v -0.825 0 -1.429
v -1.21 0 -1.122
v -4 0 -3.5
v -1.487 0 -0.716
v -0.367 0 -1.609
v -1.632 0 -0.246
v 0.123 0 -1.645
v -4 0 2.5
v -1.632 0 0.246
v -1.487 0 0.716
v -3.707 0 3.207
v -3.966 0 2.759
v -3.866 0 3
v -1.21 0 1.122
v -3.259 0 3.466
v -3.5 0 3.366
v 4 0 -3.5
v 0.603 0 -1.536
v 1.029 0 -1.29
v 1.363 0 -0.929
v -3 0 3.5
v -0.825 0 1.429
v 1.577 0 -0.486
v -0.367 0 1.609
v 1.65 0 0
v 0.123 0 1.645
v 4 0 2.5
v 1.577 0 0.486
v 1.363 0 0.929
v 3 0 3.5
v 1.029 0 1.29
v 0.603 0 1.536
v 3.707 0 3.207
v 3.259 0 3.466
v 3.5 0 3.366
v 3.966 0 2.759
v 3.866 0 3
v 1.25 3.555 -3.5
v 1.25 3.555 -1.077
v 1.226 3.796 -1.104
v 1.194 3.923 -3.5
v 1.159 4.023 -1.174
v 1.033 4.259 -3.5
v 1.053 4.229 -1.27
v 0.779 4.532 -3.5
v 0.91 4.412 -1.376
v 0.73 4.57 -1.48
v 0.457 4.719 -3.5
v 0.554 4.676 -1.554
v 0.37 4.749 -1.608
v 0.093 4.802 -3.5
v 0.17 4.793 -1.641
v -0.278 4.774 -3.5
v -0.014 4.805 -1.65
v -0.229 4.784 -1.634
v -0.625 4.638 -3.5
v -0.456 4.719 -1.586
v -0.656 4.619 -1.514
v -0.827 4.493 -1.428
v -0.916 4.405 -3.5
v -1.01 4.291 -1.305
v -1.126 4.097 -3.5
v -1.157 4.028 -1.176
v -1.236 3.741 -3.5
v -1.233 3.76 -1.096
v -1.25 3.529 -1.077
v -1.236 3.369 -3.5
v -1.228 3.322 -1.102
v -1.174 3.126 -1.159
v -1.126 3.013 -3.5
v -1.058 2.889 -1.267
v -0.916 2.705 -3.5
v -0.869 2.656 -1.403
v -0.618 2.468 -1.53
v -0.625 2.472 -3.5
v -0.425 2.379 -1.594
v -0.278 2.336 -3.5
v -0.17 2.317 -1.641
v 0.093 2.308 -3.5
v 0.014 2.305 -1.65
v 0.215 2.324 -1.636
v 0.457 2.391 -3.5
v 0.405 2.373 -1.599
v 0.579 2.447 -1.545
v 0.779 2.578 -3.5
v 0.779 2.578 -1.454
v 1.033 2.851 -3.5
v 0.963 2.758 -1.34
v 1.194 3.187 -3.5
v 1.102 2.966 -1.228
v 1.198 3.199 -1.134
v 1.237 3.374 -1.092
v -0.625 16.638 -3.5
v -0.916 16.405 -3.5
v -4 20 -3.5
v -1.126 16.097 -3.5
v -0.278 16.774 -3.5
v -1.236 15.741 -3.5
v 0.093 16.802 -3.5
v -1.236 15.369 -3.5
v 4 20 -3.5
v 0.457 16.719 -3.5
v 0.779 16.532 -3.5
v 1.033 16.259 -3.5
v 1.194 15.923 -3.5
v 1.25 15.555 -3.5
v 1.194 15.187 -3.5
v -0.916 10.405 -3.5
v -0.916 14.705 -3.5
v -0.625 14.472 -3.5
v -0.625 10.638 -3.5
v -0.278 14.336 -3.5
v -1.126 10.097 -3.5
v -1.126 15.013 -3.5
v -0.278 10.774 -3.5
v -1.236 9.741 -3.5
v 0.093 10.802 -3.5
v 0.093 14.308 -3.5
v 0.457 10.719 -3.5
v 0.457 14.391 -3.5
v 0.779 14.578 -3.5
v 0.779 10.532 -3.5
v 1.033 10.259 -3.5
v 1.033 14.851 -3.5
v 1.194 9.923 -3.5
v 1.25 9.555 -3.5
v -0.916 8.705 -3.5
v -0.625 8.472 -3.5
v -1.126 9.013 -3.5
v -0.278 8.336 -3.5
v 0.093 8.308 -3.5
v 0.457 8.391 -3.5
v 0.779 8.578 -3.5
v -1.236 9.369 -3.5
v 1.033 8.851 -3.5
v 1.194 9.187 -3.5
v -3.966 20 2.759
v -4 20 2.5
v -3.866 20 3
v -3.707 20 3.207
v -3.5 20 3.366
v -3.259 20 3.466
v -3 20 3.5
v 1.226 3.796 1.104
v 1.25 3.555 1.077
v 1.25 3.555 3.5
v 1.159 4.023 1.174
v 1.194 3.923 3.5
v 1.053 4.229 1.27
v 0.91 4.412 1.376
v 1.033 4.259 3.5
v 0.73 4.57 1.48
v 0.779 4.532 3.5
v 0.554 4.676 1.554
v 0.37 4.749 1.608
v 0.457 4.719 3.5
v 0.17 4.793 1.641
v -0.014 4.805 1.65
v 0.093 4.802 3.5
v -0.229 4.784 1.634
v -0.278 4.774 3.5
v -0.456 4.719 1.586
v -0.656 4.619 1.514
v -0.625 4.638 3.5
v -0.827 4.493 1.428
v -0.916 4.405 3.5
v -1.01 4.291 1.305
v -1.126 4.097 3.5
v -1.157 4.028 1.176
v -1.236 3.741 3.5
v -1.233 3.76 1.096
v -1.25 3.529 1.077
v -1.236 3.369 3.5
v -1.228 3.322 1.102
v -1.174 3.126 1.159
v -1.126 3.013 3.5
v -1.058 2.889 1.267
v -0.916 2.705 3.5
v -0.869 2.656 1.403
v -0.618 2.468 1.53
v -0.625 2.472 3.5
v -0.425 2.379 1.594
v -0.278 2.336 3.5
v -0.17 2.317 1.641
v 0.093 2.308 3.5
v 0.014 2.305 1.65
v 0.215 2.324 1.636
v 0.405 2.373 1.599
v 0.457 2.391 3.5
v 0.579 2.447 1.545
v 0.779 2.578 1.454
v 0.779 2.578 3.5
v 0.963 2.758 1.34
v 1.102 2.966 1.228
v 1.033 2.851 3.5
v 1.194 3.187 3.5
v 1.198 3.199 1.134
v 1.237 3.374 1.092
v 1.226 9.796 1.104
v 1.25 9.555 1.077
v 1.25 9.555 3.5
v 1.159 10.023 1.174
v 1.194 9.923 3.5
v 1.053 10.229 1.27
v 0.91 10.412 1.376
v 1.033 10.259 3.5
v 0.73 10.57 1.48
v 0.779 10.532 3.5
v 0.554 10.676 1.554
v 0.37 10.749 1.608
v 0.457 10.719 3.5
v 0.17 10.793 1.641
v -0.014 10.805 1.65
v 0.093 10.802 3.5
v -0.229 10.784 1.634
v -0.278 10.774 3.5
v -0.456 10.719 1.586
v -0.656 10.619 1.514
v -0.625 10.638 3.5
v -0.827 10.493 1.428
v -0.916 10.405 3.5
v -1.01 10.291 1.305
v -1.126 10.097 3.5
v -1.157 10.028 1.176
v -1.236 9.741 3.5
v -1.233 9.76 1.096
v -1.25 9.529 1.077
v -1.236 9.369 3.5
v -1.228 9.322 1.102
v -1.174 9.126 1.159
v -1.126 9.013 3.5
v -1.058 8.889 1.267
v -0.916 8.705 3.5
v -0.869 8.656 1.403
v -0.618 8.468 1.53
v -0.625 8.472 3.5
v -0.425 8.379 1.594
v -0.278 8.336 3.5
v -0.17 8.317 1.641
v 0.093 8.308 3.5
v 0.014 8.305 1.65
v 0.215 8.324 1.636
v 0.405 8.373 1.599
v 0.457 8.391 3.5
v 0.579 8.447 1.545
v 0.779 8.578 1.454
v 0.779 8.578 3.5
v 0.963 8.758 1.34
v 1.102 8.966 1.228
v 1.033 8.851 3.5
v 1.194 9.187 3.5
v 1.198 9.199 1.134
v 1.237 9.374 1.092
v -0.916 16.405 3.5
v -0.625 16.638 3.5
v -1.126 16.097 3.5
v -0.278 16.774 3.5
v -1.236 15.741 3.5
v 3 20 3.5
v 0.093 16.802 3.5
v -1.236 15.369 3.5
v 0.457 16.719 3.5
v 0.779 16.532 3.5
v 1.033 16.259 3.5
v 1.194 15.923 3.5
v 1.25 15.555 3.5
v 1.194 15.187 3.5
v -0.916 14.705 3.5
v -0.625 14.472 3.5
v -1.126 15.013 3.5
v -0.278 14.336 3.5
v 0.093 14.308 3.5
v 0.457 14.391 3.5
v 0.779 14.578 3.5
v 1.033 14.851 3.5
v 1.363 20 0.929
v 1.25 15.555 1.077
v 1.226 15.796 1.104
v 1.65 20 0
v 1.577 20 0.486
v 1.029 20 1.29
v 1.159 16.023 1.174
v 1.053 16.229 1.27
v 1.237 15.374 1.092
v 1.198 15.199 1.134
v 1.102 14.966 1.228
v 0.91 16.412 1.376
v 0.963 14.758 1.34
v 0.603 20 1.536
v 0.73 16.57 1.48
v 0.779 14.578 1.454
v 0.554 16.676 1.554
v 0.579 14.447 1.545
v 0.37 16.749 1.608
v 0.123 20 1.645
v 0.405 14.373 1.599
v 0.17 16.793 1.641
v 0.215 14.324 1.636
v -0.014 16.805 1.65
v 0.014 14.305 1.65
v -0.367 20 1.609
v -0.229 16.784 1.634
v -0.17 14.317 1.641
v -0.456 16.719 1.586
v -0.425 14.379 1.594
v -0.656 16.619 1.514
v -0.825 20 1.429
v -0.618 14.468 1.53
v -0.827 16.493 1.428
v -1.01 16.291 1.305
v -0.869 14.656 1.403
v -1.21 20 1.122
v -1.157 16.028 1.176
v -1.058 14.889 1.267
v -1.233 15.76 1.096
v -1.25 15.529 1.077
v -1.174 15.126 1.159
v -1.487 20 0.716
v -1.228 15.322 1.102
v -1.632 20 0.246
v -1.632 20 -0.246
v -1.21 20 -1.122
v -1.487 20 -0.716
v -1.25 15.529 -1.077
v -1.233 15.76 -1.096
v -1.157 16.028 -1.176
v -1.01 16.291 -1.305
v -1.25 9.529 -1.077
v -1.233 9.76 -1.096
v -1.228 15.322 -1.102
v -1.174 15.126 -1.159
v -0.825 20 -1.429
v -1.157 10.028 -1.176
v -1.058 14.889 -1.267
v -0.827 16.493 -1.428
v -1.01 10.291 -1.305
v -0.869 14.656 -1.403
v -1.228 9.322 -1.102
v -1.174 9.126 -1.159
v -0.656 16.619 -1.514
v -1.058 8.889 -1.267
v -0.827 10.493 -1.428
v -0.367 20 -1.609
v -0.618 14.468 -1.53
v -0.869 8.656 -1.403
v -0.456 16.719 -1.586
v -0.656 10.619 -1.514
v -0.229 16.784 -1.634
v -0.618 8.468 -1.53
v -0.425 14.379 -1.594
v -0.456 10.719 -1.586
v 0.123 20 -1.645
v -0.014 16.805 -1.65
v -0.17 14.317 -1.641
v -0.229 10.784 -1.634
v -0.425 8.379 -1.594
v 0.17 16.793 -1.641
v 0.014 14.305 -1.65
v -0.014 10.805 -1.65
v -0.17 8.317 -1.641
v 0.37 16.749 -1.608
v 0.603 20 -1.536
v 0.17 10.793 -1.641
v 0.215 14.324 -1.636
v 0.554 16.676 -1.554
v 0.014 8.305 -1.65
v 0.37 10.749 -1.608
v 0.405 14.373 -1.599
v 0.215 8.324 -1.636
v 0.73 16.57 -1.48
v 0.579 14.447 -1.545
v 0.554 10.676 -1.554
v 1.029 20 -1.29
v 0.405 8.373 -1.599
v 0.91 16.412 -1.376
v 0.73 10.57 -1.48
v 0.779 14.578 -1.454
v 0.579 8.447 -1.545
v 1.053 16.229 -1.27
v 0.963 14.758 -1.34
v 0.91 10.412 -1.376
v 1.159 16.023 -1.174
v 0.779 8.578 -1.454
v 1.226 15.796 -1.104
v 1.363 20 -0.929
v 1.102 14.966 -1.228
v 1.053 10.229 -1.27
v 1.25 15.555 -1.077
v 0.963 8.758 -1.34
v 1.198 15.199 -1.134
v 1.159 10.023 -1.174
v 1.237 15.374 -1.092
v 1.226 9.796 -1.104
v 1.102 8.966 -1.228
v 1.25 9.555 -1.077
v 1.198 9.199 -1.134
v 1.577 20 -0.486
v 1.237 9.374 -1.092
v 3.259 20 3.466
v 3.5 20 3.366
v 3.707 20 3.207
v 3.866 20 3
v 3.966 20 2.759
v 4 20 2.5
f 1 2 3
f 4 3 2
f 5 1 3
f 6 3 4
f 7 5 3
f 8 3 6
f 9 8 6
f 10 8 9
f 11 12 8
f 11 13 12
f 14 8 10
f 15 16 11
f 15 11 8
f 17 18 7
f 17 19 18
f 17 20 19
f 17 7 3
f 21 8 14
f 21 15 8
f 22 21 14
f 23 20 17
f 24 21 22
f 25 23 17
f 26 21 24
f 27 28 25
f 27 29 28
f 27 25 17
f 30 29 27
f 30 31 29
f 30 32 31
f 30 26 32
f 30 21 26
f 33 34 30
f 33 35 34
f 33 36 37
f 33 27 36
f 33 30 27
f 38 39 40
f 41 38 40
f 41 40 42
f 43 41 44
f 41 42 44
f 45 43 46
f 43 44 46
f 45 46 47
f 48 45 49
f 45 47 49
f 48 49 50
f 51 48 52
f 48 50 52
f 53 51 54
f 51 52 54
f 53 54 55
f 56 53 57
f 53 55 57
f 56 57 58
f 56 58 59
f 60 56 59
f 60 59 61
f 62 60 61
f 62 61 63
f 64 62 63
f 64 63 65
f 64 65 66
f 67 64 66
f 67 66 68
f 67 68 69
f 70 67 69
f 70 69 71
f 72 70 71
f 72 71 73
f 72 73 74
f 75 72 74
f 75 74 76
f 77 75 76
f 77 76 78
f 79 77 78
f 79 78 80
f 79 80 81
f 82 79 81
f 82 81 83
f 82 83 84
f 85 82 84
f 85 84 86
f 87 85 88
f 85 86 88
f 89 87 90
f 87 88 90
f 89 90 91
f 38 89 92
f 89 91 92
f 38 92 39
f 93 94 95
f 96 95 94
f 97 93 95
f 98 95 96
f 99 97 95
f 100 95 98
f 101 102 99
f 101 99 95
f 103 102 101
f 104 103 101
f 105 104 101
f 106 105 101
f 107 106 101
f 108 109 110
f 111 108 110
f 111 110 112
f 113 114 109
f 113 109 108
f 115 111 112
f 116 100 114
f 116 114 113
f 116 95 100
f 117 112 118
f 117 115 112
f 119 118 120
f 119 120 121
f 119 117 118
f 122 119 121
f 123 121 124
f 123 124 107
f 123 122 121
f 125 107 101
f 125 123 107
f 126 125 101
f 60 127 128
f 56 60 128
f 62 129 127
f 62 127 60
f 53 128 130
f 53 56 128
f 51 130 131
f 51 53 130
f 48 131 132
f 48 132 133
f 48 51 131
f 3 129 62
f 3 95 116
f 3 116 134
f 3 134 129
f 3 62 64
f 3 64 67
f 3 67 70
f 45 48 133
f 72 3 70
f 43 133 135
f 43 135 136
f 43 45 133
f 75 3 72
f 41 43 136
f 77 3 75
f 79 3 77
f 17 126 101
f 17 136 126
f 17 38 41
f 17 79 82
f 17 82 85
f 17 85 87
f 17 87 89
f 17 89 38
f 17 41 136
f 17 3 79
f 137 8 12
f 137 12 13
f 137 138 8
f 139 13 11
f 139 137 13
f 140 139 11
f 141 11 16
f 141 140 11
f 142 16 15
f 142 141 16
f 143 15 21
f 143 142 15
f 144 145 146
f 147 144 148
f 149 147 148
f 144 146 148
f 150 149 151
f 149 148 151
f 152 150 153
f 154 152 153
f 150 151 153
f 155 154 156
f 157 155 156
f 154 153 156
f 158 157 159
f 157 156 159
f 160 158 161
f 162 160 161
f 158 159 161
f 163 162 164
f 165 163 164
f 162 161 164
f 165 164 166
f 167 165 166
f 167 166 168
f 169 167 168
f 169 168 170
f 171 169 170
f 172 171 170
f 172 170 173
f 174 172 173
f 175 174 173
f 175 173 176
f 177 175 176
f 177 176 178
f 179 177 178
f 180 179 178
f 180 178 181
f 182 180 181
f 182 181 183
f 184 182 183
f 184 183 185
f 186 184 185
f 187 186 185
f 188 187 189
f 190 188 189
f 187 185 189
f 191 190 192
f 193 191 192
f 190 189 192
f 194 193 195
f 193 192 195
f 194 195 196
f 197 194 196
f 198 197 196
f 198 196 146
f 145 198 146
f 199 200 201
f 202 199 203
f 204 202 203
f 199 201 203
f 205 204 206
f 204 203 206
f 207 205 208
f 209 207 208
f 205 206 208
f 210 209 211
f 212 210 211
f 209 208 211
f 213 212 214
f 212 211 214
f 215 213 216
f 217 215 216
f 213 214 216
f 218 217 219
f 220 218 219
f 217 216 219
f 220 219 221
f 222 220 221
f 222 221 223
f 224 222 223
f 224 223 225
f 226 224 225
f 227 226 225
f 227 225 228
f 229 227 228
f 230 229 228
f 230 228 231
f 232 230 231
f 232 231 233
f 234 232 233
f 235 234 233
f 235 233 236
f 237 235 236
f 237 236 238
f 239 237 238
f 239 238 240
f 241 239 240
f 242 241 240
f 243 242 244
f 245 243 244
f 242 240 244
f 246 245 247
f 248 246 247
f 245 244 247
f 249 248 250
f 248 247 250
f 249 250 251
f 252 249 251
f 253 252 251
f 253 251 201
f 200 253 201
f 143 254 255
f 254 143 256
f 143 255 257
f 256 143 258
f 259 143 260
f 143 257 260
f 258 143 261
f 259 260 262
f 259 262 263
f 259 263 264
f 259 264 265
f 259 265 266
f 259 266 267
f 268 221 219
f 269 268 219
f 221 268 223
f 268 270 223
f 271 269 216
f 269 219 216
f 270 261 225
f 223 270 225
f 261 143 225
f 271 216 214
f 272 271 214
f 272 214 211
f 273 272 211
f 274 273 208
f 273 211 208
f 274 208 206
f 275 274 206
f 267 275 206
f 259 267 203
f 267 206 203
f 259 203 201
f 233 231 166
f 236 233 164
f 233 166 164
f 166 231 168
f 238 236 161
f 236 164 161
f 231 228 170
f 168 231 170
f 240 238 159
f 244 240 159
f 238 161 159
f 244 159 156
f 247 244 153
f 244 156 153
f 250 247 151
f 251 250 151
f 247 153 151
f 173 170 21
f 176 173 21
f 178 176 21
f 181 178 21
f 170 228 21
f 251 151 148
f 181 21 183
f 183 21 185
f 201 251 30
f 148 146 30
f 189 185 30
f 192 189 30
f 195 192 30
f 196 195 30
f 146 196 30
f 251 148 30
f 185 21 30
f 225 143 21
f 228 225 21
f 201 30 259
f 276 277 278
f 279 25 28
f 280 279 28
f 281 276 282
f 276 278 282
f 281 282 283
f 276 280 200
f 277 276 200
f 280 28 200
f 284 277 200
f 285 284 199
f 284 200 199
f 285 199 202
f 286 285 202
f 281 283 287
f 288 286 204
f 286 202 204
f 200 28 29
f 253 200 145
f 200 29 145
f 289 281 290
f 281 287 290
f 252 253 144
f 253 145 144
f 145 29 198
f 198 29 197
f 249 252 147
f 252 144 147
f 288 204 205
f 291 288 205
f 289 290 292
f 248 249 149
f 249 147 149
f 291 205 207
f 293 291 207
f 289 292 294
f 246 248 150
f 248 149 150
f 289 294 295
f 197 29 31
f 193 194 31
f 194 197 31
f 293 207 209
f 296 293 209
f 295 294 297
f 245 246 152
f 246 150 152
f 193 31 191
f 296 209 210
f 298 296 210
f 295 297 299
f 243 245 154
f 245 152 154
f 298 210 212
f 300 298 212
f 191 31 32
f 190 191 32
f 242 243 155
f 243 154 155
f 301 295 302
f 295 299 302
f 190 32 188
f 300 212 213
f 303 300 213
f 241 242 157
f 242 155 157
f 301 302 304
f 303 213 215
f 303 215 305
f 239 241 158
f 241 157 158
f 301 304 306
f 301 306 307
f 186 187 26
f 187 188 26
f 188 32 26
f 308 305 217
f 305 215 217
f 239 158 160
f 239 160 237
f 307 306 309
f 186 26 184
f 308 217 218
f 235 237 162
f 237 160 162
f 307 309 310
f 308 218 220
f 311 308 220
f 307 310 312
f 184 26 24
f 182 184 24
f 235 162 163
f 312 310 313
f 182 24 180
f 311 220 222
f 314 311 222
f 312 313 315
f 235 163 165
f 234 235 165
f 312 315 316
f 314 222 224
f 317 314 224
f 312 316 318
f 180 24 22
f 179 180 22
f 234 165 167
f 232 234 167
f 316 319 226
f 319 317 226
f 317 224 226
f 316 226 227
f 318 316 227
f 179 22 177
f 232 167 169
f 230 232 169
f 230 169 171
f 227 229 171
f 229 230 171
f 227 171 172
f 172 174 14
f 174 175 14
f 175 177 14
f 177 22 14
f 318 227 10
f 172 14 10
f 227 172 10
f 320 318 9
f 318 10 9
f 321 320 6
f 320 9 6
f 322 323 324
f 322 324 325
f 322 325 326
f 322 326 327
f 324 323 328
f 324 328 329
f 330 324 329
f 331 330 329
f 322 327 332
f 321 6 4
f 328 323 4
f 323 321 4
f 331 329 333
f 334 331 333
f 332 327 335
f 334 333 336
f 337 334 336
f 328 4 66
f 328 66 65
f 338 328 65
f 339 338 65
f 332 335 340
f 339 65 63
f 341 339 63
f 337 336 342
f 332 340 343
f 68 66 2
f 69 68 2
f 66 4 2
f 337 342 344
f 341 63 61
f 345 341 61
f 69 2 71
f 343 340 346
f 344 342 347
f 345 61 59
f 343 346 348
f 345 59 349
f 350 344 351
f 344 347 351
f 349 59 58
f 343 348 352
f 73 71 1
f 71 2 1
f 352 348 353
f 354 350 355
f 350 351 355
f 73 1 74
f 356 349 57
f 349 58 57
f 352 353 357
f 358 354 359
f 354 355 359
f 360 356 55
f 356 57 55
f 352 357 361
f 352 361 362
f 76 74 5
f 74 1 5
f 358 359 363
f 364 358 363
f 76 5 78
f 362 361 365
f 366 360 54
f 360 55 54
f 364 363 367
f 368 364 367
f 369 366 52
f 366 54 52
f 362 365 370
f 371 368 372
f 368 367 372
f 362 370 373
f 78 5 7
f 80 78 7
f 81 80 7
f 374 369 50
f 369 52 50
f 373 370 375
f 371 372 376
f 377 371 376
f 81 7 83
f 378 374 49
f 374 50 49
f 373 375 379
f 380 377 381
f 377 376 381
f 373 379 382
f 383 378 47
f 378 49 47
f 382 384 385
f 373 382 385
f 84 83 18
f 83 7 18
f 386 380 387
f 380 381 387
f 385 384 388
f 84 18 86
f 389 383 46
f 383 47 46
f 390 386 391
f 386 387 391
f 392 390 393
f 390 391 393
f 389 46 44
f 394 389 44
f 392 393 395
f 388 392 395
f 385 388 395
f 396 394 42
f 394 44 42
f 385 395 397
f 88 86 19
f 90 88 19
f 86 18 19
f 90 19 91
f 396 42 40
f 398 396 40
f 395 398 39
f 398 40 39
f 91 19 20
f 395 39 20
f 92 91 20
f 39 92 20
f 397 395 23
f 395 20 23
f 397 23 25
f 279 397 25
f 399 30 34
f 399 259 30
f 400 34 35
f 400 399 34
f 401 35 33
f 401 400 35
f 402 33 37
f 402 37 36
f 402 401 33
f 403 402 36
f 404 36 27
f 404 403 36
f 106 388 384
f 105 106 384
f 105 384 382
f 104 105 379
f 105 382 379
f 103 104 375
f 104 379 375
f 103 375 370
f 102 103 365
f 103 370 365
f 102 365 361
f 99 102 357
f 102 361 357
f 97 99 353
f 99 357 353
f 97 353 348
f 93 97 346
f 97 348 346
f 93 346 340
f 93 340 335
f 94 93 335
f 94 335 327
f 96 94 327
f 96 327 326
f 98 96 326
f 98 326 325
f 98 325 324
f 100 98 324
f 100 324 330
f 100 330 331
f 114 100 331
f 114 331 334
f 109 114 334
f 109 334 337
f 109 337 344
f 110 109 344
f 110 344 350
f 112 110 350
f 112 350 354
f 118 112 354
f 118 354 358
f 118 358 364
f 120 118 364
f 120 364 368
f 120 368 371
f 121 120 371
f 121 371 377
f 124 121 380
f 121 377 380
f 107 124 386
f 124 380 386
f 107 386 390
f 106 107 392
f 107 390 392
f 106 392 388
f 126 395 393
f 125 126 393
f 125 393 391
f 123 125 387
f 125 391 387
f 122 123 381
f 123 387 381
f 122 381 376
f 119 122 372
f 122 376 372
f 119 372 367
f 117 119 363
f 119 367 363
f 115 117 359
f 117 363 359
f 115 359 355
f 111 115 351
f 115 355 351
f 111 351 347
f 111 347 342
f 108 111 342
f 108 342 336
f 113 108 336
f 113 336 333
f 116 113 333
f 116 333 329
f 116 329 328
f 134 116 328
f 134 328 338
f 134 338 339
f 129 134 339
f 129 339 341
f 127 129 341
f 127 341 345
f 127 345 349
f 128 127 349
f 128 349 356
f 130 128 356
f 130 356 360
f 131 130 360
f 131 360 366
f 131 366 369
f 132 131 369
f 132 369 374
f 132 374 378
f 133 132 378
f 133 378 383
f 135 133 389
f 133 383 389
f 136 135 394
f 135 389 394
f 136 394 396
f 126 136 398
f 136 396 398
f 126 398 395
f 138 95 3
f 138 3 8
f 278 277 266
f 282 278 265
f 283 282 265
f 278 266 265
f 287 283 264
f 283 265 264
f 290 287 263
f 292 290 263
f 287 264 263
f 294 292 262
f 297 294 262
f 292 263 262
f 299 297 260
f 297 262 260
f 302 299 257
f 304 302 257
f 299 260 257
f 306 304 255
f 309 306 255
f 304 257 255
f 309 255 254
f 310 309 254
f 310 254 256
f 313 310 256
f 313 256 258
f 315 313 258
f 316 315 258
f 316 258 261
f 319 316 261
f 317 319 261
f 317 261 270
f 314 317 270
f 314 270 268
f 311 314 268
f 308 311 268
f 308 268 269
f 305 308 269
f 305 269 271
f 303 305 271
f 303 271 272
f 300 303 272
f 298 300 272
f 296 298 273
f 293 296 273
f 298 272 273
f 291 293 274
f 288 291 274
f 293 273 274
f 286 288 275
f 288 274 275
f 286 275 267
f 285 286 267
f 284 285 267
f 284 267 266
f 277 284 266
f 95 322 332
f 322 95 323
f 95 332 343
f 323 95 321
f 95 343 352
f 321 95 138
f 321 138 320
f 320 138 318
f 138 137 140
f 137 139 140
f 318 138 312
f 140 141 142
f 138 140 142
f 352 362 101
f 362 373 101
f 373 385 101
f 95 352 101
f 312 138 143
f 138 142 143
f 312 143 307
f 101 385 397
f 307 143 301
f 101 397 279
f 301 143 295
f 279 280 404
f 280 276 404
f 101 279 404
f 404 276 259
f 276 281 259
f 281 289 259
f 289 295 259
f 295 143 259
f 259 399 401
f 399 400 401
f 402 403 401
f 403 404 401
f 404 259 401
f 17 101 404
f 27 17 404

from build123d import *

# Parameters (mm, degrees)
F0_W     = 8
F0_H     = 7
F0_R     = 1.65
F1_DEPTH = 20
F2_R     = 1.25
F3_DEPTH = 7.001
F4_R     = 1


with BuildPart() as f1:
    # F0 (on Front) → F1 (new body)
    with BuildSketch(Plane.XZ):
        Rectangle(F0_W, F0_H)
        Circle(F0_R, mode=Mode.SUBTRACT)
    extrude(amount=-F1_DEPTH)

    # F2 (on face) → F3 (cut, through all)
    with BuildSketch(Plane.XY.offset(3.5)):
        with Locations((0, 15.555)):
            Circle(F2_R)
        with Locations((0, 9.555)):
            Circle(F2_R)
        with Locations((0, 3.555)):
            Circle(F2_R)
    extrude(amount=-F3_DEPTH, mode=Mode.SUBTRACT)

    # F4
    f4_edges = [f1.edges().sort_by_distance(p)[0] for p in [
        (4, 10, 3.5),
        (-4, 10, 3.5),
    ]]
    fillet(f4_edges, radius=F4_R)


solid = f1.part
